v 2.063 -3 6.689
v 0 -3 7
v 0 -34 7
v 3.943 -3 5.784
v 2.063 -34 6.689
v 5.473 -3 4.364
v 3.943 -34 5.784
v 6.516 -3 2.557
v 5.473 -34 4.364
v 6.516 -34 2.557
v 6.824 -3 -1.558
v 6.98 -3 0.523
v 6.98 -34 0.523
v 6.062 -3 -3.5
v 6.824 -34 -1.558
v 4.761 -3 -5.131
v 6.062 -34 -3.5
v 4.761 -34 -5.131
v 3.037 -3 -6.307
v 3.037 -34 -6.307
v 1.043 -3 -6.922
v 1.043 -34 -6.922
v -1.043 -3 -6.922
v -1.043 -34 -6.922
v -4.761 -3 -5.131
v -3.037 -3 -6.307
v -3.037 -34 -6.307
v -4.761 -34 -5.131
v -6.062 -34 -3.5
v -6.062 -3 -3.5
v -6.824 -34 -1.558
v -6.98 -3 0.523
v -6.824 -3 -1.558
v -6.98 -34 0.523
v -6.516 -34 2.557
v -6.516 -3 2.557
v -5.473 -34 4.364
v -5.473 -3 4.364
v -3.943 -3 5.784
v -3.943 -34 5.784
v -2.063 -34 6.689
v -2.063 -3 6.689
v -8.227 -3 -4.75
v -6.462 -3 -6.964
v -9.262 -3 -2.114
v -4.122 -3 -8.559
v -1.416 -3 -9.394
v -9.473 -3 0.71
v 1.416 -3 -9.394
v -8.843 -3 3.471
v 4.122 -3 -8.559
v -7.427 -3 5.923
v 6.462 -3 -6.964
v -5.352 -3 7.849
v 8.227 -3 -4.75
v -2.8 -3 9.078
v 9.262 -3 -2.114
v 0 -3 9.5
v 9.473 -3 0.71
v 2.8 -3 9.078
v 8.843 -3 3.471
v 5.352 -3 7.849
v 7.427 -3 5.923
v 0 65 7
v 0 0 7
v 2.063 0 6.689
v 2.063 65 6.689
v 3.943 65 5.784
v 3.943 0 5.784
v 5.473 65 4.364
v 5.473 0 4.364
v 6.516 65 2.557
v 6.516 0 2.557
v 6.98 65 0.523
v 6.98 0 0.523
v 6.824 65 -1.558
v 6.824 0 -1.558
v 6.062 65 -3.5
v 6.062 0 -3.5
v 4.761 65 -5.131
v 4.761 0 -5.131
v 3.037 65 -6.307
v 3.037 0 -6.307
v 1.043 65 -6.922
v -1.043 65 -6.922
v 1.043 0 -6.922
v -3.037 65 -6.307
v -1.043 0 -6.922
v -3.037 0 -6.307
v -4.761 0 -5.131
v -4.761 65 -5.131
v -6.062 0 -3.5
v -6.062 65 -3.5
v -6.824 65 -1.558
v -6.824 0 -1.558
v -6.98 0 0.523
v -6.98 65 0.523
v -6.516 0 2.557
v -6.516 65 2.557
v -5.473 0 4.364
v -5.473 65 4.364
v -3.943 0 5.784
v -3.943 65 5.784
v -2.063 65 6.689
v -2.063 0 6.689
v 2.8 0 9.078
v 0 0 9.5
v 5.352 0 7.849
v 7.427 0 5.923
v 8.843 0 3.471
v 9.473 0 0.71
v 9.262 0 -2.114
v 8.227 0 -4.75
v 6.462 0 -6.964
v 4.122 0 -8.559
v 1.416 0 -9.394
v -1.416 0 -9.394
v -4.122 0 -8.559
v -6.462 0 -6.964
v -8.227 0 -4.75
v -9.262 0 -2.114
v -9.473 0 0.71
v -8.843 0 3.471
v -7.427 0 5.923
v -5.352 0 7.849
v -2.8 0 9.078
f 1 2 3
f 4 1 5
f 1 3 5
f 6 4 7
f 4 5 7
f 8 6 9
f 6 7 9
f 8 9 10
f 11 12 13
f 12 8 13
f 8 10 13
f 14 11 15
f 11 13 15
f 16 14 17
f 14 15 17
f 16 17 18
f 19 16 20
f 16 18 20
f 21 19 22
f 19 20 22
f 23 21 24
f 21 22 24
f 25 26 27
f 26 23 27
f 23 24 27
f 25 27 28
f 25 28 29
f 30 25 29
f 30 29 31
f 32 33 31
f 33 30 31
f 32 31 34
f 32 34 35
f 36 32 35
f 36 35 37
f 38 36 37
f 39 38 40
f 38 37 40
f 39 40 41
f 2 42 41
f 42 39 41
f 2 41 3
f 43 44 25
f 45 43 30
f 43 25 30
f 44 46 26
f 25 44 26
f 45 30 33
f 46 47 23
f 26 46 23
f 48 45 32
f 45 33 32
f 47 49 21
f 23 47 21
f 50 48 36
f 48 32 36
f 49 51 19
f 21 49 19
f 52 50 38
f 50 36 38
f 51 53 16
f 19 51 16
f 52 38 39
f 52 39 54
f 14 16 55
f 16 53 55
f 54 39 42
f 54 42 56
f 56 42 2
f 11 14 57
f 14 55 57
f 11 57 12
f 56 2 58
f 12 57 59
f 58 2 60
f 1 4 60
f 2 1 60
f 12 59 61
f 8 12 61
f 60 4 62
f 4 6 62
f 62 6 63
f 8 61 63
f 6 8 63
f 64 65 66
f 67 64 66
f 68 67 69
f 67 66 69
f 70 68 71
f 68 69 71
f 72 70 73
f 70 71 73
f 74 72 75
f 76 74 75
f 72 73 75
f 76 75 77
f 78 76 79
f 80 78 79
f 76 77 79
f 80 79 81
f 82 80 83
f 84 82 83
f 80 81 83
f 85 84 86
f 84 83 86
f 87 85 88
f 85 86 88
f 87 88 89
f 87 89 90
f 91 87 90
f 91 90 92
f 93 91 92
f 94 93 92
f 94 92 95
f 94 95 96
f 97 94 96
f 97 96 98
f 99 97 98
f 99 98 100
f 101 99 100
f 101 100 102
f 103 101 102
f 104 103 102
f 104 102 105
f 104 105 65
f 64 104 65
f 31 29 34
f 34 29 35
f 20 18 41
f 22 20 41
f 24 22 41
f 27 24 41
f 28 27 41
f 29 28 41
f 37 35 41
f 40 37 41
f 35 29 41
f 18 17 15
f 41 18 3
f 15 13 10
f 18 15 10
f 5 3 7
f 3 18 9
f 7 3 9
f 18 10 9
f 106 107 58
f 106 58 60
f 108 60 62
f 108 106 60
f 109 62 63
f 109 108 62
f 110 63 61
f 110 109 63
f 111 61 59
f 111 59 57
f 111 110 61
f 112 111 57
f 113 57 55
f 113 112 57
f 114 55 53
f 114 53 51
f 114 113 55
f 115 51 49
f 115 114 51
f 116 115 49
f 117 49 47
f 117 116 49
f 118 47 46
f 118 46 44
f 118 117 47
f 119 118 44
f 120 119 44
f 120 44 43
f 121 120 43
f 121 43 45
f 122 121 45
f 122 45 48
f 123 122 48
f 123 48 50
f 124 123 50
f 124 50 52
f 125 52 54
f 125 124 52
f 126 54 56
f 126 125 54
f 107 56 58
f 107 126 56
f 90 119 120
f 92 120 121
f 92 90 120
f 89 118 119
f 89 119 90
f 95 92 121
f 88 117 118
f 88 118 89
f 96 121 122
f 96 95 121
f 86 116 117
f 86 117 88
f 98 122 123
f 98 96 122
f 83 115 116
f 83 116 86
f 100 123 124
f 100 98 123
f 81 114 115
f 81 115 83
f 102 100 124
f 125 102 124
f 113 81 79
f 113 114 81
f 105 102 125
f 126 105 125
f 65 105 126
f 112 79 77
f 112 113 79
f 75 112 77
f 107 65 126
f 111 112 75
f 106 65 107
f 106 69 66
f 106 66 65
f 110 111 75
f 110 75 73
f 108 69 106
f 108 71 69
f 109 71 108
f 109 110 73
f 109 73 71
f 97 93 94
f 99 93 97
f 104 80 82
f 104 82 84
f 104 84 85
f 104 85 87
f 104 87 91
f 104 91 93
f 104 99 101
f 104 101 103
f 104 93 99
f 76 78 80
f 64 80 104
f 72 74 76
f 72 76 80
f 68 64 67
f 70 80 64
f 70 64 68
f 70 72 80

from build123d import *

# Parameters (mm, degrees)
BOSS_EXTRUDE1_DEPTH      = 65
BOSS_EXTRUDE1_DEPTH_BACK = 34
SKETCH1_R                = 7
SKETCH2_R                = 9.5
BOSS_EXTRUDE2_DEPTH      = 3


with BuildPart() as part:
    # Sketch1 → Boss-Extrude1 (new, two sides: drawn at the far end of the back side and taken through both)
    with BuildSketch(Plane(origin=(0, 0, 0), x_dir=(1, 0, 0), z_dir=(0, 1, 0)).offset(-BOSS_EXTRUDE1_DEPTH_BACK)):
        with Locations(Location((0, 0, 0), (0, 0, 270))):
            Circle(SKETCH1_R)
    extrude(amount=BOSS_EXTRUDE1_DEPTH + BOSS_EXTRUDE1_DEPTH_BACK)

    # Sketch2 → Boss-Extrude2 (add)
    with BuildSketch(Plane(origin=(0, 0, 0), x_dir=(1, 0, 0), z_dir=(0, 1, 0))):
        with Locations(Location((0, 0, 0), (0, 0, 270))):
            Circle(SKETCH2_R)
    extrude(amount=-BOSS_EXTRUDE2_DEPTH)


solid = part.part
